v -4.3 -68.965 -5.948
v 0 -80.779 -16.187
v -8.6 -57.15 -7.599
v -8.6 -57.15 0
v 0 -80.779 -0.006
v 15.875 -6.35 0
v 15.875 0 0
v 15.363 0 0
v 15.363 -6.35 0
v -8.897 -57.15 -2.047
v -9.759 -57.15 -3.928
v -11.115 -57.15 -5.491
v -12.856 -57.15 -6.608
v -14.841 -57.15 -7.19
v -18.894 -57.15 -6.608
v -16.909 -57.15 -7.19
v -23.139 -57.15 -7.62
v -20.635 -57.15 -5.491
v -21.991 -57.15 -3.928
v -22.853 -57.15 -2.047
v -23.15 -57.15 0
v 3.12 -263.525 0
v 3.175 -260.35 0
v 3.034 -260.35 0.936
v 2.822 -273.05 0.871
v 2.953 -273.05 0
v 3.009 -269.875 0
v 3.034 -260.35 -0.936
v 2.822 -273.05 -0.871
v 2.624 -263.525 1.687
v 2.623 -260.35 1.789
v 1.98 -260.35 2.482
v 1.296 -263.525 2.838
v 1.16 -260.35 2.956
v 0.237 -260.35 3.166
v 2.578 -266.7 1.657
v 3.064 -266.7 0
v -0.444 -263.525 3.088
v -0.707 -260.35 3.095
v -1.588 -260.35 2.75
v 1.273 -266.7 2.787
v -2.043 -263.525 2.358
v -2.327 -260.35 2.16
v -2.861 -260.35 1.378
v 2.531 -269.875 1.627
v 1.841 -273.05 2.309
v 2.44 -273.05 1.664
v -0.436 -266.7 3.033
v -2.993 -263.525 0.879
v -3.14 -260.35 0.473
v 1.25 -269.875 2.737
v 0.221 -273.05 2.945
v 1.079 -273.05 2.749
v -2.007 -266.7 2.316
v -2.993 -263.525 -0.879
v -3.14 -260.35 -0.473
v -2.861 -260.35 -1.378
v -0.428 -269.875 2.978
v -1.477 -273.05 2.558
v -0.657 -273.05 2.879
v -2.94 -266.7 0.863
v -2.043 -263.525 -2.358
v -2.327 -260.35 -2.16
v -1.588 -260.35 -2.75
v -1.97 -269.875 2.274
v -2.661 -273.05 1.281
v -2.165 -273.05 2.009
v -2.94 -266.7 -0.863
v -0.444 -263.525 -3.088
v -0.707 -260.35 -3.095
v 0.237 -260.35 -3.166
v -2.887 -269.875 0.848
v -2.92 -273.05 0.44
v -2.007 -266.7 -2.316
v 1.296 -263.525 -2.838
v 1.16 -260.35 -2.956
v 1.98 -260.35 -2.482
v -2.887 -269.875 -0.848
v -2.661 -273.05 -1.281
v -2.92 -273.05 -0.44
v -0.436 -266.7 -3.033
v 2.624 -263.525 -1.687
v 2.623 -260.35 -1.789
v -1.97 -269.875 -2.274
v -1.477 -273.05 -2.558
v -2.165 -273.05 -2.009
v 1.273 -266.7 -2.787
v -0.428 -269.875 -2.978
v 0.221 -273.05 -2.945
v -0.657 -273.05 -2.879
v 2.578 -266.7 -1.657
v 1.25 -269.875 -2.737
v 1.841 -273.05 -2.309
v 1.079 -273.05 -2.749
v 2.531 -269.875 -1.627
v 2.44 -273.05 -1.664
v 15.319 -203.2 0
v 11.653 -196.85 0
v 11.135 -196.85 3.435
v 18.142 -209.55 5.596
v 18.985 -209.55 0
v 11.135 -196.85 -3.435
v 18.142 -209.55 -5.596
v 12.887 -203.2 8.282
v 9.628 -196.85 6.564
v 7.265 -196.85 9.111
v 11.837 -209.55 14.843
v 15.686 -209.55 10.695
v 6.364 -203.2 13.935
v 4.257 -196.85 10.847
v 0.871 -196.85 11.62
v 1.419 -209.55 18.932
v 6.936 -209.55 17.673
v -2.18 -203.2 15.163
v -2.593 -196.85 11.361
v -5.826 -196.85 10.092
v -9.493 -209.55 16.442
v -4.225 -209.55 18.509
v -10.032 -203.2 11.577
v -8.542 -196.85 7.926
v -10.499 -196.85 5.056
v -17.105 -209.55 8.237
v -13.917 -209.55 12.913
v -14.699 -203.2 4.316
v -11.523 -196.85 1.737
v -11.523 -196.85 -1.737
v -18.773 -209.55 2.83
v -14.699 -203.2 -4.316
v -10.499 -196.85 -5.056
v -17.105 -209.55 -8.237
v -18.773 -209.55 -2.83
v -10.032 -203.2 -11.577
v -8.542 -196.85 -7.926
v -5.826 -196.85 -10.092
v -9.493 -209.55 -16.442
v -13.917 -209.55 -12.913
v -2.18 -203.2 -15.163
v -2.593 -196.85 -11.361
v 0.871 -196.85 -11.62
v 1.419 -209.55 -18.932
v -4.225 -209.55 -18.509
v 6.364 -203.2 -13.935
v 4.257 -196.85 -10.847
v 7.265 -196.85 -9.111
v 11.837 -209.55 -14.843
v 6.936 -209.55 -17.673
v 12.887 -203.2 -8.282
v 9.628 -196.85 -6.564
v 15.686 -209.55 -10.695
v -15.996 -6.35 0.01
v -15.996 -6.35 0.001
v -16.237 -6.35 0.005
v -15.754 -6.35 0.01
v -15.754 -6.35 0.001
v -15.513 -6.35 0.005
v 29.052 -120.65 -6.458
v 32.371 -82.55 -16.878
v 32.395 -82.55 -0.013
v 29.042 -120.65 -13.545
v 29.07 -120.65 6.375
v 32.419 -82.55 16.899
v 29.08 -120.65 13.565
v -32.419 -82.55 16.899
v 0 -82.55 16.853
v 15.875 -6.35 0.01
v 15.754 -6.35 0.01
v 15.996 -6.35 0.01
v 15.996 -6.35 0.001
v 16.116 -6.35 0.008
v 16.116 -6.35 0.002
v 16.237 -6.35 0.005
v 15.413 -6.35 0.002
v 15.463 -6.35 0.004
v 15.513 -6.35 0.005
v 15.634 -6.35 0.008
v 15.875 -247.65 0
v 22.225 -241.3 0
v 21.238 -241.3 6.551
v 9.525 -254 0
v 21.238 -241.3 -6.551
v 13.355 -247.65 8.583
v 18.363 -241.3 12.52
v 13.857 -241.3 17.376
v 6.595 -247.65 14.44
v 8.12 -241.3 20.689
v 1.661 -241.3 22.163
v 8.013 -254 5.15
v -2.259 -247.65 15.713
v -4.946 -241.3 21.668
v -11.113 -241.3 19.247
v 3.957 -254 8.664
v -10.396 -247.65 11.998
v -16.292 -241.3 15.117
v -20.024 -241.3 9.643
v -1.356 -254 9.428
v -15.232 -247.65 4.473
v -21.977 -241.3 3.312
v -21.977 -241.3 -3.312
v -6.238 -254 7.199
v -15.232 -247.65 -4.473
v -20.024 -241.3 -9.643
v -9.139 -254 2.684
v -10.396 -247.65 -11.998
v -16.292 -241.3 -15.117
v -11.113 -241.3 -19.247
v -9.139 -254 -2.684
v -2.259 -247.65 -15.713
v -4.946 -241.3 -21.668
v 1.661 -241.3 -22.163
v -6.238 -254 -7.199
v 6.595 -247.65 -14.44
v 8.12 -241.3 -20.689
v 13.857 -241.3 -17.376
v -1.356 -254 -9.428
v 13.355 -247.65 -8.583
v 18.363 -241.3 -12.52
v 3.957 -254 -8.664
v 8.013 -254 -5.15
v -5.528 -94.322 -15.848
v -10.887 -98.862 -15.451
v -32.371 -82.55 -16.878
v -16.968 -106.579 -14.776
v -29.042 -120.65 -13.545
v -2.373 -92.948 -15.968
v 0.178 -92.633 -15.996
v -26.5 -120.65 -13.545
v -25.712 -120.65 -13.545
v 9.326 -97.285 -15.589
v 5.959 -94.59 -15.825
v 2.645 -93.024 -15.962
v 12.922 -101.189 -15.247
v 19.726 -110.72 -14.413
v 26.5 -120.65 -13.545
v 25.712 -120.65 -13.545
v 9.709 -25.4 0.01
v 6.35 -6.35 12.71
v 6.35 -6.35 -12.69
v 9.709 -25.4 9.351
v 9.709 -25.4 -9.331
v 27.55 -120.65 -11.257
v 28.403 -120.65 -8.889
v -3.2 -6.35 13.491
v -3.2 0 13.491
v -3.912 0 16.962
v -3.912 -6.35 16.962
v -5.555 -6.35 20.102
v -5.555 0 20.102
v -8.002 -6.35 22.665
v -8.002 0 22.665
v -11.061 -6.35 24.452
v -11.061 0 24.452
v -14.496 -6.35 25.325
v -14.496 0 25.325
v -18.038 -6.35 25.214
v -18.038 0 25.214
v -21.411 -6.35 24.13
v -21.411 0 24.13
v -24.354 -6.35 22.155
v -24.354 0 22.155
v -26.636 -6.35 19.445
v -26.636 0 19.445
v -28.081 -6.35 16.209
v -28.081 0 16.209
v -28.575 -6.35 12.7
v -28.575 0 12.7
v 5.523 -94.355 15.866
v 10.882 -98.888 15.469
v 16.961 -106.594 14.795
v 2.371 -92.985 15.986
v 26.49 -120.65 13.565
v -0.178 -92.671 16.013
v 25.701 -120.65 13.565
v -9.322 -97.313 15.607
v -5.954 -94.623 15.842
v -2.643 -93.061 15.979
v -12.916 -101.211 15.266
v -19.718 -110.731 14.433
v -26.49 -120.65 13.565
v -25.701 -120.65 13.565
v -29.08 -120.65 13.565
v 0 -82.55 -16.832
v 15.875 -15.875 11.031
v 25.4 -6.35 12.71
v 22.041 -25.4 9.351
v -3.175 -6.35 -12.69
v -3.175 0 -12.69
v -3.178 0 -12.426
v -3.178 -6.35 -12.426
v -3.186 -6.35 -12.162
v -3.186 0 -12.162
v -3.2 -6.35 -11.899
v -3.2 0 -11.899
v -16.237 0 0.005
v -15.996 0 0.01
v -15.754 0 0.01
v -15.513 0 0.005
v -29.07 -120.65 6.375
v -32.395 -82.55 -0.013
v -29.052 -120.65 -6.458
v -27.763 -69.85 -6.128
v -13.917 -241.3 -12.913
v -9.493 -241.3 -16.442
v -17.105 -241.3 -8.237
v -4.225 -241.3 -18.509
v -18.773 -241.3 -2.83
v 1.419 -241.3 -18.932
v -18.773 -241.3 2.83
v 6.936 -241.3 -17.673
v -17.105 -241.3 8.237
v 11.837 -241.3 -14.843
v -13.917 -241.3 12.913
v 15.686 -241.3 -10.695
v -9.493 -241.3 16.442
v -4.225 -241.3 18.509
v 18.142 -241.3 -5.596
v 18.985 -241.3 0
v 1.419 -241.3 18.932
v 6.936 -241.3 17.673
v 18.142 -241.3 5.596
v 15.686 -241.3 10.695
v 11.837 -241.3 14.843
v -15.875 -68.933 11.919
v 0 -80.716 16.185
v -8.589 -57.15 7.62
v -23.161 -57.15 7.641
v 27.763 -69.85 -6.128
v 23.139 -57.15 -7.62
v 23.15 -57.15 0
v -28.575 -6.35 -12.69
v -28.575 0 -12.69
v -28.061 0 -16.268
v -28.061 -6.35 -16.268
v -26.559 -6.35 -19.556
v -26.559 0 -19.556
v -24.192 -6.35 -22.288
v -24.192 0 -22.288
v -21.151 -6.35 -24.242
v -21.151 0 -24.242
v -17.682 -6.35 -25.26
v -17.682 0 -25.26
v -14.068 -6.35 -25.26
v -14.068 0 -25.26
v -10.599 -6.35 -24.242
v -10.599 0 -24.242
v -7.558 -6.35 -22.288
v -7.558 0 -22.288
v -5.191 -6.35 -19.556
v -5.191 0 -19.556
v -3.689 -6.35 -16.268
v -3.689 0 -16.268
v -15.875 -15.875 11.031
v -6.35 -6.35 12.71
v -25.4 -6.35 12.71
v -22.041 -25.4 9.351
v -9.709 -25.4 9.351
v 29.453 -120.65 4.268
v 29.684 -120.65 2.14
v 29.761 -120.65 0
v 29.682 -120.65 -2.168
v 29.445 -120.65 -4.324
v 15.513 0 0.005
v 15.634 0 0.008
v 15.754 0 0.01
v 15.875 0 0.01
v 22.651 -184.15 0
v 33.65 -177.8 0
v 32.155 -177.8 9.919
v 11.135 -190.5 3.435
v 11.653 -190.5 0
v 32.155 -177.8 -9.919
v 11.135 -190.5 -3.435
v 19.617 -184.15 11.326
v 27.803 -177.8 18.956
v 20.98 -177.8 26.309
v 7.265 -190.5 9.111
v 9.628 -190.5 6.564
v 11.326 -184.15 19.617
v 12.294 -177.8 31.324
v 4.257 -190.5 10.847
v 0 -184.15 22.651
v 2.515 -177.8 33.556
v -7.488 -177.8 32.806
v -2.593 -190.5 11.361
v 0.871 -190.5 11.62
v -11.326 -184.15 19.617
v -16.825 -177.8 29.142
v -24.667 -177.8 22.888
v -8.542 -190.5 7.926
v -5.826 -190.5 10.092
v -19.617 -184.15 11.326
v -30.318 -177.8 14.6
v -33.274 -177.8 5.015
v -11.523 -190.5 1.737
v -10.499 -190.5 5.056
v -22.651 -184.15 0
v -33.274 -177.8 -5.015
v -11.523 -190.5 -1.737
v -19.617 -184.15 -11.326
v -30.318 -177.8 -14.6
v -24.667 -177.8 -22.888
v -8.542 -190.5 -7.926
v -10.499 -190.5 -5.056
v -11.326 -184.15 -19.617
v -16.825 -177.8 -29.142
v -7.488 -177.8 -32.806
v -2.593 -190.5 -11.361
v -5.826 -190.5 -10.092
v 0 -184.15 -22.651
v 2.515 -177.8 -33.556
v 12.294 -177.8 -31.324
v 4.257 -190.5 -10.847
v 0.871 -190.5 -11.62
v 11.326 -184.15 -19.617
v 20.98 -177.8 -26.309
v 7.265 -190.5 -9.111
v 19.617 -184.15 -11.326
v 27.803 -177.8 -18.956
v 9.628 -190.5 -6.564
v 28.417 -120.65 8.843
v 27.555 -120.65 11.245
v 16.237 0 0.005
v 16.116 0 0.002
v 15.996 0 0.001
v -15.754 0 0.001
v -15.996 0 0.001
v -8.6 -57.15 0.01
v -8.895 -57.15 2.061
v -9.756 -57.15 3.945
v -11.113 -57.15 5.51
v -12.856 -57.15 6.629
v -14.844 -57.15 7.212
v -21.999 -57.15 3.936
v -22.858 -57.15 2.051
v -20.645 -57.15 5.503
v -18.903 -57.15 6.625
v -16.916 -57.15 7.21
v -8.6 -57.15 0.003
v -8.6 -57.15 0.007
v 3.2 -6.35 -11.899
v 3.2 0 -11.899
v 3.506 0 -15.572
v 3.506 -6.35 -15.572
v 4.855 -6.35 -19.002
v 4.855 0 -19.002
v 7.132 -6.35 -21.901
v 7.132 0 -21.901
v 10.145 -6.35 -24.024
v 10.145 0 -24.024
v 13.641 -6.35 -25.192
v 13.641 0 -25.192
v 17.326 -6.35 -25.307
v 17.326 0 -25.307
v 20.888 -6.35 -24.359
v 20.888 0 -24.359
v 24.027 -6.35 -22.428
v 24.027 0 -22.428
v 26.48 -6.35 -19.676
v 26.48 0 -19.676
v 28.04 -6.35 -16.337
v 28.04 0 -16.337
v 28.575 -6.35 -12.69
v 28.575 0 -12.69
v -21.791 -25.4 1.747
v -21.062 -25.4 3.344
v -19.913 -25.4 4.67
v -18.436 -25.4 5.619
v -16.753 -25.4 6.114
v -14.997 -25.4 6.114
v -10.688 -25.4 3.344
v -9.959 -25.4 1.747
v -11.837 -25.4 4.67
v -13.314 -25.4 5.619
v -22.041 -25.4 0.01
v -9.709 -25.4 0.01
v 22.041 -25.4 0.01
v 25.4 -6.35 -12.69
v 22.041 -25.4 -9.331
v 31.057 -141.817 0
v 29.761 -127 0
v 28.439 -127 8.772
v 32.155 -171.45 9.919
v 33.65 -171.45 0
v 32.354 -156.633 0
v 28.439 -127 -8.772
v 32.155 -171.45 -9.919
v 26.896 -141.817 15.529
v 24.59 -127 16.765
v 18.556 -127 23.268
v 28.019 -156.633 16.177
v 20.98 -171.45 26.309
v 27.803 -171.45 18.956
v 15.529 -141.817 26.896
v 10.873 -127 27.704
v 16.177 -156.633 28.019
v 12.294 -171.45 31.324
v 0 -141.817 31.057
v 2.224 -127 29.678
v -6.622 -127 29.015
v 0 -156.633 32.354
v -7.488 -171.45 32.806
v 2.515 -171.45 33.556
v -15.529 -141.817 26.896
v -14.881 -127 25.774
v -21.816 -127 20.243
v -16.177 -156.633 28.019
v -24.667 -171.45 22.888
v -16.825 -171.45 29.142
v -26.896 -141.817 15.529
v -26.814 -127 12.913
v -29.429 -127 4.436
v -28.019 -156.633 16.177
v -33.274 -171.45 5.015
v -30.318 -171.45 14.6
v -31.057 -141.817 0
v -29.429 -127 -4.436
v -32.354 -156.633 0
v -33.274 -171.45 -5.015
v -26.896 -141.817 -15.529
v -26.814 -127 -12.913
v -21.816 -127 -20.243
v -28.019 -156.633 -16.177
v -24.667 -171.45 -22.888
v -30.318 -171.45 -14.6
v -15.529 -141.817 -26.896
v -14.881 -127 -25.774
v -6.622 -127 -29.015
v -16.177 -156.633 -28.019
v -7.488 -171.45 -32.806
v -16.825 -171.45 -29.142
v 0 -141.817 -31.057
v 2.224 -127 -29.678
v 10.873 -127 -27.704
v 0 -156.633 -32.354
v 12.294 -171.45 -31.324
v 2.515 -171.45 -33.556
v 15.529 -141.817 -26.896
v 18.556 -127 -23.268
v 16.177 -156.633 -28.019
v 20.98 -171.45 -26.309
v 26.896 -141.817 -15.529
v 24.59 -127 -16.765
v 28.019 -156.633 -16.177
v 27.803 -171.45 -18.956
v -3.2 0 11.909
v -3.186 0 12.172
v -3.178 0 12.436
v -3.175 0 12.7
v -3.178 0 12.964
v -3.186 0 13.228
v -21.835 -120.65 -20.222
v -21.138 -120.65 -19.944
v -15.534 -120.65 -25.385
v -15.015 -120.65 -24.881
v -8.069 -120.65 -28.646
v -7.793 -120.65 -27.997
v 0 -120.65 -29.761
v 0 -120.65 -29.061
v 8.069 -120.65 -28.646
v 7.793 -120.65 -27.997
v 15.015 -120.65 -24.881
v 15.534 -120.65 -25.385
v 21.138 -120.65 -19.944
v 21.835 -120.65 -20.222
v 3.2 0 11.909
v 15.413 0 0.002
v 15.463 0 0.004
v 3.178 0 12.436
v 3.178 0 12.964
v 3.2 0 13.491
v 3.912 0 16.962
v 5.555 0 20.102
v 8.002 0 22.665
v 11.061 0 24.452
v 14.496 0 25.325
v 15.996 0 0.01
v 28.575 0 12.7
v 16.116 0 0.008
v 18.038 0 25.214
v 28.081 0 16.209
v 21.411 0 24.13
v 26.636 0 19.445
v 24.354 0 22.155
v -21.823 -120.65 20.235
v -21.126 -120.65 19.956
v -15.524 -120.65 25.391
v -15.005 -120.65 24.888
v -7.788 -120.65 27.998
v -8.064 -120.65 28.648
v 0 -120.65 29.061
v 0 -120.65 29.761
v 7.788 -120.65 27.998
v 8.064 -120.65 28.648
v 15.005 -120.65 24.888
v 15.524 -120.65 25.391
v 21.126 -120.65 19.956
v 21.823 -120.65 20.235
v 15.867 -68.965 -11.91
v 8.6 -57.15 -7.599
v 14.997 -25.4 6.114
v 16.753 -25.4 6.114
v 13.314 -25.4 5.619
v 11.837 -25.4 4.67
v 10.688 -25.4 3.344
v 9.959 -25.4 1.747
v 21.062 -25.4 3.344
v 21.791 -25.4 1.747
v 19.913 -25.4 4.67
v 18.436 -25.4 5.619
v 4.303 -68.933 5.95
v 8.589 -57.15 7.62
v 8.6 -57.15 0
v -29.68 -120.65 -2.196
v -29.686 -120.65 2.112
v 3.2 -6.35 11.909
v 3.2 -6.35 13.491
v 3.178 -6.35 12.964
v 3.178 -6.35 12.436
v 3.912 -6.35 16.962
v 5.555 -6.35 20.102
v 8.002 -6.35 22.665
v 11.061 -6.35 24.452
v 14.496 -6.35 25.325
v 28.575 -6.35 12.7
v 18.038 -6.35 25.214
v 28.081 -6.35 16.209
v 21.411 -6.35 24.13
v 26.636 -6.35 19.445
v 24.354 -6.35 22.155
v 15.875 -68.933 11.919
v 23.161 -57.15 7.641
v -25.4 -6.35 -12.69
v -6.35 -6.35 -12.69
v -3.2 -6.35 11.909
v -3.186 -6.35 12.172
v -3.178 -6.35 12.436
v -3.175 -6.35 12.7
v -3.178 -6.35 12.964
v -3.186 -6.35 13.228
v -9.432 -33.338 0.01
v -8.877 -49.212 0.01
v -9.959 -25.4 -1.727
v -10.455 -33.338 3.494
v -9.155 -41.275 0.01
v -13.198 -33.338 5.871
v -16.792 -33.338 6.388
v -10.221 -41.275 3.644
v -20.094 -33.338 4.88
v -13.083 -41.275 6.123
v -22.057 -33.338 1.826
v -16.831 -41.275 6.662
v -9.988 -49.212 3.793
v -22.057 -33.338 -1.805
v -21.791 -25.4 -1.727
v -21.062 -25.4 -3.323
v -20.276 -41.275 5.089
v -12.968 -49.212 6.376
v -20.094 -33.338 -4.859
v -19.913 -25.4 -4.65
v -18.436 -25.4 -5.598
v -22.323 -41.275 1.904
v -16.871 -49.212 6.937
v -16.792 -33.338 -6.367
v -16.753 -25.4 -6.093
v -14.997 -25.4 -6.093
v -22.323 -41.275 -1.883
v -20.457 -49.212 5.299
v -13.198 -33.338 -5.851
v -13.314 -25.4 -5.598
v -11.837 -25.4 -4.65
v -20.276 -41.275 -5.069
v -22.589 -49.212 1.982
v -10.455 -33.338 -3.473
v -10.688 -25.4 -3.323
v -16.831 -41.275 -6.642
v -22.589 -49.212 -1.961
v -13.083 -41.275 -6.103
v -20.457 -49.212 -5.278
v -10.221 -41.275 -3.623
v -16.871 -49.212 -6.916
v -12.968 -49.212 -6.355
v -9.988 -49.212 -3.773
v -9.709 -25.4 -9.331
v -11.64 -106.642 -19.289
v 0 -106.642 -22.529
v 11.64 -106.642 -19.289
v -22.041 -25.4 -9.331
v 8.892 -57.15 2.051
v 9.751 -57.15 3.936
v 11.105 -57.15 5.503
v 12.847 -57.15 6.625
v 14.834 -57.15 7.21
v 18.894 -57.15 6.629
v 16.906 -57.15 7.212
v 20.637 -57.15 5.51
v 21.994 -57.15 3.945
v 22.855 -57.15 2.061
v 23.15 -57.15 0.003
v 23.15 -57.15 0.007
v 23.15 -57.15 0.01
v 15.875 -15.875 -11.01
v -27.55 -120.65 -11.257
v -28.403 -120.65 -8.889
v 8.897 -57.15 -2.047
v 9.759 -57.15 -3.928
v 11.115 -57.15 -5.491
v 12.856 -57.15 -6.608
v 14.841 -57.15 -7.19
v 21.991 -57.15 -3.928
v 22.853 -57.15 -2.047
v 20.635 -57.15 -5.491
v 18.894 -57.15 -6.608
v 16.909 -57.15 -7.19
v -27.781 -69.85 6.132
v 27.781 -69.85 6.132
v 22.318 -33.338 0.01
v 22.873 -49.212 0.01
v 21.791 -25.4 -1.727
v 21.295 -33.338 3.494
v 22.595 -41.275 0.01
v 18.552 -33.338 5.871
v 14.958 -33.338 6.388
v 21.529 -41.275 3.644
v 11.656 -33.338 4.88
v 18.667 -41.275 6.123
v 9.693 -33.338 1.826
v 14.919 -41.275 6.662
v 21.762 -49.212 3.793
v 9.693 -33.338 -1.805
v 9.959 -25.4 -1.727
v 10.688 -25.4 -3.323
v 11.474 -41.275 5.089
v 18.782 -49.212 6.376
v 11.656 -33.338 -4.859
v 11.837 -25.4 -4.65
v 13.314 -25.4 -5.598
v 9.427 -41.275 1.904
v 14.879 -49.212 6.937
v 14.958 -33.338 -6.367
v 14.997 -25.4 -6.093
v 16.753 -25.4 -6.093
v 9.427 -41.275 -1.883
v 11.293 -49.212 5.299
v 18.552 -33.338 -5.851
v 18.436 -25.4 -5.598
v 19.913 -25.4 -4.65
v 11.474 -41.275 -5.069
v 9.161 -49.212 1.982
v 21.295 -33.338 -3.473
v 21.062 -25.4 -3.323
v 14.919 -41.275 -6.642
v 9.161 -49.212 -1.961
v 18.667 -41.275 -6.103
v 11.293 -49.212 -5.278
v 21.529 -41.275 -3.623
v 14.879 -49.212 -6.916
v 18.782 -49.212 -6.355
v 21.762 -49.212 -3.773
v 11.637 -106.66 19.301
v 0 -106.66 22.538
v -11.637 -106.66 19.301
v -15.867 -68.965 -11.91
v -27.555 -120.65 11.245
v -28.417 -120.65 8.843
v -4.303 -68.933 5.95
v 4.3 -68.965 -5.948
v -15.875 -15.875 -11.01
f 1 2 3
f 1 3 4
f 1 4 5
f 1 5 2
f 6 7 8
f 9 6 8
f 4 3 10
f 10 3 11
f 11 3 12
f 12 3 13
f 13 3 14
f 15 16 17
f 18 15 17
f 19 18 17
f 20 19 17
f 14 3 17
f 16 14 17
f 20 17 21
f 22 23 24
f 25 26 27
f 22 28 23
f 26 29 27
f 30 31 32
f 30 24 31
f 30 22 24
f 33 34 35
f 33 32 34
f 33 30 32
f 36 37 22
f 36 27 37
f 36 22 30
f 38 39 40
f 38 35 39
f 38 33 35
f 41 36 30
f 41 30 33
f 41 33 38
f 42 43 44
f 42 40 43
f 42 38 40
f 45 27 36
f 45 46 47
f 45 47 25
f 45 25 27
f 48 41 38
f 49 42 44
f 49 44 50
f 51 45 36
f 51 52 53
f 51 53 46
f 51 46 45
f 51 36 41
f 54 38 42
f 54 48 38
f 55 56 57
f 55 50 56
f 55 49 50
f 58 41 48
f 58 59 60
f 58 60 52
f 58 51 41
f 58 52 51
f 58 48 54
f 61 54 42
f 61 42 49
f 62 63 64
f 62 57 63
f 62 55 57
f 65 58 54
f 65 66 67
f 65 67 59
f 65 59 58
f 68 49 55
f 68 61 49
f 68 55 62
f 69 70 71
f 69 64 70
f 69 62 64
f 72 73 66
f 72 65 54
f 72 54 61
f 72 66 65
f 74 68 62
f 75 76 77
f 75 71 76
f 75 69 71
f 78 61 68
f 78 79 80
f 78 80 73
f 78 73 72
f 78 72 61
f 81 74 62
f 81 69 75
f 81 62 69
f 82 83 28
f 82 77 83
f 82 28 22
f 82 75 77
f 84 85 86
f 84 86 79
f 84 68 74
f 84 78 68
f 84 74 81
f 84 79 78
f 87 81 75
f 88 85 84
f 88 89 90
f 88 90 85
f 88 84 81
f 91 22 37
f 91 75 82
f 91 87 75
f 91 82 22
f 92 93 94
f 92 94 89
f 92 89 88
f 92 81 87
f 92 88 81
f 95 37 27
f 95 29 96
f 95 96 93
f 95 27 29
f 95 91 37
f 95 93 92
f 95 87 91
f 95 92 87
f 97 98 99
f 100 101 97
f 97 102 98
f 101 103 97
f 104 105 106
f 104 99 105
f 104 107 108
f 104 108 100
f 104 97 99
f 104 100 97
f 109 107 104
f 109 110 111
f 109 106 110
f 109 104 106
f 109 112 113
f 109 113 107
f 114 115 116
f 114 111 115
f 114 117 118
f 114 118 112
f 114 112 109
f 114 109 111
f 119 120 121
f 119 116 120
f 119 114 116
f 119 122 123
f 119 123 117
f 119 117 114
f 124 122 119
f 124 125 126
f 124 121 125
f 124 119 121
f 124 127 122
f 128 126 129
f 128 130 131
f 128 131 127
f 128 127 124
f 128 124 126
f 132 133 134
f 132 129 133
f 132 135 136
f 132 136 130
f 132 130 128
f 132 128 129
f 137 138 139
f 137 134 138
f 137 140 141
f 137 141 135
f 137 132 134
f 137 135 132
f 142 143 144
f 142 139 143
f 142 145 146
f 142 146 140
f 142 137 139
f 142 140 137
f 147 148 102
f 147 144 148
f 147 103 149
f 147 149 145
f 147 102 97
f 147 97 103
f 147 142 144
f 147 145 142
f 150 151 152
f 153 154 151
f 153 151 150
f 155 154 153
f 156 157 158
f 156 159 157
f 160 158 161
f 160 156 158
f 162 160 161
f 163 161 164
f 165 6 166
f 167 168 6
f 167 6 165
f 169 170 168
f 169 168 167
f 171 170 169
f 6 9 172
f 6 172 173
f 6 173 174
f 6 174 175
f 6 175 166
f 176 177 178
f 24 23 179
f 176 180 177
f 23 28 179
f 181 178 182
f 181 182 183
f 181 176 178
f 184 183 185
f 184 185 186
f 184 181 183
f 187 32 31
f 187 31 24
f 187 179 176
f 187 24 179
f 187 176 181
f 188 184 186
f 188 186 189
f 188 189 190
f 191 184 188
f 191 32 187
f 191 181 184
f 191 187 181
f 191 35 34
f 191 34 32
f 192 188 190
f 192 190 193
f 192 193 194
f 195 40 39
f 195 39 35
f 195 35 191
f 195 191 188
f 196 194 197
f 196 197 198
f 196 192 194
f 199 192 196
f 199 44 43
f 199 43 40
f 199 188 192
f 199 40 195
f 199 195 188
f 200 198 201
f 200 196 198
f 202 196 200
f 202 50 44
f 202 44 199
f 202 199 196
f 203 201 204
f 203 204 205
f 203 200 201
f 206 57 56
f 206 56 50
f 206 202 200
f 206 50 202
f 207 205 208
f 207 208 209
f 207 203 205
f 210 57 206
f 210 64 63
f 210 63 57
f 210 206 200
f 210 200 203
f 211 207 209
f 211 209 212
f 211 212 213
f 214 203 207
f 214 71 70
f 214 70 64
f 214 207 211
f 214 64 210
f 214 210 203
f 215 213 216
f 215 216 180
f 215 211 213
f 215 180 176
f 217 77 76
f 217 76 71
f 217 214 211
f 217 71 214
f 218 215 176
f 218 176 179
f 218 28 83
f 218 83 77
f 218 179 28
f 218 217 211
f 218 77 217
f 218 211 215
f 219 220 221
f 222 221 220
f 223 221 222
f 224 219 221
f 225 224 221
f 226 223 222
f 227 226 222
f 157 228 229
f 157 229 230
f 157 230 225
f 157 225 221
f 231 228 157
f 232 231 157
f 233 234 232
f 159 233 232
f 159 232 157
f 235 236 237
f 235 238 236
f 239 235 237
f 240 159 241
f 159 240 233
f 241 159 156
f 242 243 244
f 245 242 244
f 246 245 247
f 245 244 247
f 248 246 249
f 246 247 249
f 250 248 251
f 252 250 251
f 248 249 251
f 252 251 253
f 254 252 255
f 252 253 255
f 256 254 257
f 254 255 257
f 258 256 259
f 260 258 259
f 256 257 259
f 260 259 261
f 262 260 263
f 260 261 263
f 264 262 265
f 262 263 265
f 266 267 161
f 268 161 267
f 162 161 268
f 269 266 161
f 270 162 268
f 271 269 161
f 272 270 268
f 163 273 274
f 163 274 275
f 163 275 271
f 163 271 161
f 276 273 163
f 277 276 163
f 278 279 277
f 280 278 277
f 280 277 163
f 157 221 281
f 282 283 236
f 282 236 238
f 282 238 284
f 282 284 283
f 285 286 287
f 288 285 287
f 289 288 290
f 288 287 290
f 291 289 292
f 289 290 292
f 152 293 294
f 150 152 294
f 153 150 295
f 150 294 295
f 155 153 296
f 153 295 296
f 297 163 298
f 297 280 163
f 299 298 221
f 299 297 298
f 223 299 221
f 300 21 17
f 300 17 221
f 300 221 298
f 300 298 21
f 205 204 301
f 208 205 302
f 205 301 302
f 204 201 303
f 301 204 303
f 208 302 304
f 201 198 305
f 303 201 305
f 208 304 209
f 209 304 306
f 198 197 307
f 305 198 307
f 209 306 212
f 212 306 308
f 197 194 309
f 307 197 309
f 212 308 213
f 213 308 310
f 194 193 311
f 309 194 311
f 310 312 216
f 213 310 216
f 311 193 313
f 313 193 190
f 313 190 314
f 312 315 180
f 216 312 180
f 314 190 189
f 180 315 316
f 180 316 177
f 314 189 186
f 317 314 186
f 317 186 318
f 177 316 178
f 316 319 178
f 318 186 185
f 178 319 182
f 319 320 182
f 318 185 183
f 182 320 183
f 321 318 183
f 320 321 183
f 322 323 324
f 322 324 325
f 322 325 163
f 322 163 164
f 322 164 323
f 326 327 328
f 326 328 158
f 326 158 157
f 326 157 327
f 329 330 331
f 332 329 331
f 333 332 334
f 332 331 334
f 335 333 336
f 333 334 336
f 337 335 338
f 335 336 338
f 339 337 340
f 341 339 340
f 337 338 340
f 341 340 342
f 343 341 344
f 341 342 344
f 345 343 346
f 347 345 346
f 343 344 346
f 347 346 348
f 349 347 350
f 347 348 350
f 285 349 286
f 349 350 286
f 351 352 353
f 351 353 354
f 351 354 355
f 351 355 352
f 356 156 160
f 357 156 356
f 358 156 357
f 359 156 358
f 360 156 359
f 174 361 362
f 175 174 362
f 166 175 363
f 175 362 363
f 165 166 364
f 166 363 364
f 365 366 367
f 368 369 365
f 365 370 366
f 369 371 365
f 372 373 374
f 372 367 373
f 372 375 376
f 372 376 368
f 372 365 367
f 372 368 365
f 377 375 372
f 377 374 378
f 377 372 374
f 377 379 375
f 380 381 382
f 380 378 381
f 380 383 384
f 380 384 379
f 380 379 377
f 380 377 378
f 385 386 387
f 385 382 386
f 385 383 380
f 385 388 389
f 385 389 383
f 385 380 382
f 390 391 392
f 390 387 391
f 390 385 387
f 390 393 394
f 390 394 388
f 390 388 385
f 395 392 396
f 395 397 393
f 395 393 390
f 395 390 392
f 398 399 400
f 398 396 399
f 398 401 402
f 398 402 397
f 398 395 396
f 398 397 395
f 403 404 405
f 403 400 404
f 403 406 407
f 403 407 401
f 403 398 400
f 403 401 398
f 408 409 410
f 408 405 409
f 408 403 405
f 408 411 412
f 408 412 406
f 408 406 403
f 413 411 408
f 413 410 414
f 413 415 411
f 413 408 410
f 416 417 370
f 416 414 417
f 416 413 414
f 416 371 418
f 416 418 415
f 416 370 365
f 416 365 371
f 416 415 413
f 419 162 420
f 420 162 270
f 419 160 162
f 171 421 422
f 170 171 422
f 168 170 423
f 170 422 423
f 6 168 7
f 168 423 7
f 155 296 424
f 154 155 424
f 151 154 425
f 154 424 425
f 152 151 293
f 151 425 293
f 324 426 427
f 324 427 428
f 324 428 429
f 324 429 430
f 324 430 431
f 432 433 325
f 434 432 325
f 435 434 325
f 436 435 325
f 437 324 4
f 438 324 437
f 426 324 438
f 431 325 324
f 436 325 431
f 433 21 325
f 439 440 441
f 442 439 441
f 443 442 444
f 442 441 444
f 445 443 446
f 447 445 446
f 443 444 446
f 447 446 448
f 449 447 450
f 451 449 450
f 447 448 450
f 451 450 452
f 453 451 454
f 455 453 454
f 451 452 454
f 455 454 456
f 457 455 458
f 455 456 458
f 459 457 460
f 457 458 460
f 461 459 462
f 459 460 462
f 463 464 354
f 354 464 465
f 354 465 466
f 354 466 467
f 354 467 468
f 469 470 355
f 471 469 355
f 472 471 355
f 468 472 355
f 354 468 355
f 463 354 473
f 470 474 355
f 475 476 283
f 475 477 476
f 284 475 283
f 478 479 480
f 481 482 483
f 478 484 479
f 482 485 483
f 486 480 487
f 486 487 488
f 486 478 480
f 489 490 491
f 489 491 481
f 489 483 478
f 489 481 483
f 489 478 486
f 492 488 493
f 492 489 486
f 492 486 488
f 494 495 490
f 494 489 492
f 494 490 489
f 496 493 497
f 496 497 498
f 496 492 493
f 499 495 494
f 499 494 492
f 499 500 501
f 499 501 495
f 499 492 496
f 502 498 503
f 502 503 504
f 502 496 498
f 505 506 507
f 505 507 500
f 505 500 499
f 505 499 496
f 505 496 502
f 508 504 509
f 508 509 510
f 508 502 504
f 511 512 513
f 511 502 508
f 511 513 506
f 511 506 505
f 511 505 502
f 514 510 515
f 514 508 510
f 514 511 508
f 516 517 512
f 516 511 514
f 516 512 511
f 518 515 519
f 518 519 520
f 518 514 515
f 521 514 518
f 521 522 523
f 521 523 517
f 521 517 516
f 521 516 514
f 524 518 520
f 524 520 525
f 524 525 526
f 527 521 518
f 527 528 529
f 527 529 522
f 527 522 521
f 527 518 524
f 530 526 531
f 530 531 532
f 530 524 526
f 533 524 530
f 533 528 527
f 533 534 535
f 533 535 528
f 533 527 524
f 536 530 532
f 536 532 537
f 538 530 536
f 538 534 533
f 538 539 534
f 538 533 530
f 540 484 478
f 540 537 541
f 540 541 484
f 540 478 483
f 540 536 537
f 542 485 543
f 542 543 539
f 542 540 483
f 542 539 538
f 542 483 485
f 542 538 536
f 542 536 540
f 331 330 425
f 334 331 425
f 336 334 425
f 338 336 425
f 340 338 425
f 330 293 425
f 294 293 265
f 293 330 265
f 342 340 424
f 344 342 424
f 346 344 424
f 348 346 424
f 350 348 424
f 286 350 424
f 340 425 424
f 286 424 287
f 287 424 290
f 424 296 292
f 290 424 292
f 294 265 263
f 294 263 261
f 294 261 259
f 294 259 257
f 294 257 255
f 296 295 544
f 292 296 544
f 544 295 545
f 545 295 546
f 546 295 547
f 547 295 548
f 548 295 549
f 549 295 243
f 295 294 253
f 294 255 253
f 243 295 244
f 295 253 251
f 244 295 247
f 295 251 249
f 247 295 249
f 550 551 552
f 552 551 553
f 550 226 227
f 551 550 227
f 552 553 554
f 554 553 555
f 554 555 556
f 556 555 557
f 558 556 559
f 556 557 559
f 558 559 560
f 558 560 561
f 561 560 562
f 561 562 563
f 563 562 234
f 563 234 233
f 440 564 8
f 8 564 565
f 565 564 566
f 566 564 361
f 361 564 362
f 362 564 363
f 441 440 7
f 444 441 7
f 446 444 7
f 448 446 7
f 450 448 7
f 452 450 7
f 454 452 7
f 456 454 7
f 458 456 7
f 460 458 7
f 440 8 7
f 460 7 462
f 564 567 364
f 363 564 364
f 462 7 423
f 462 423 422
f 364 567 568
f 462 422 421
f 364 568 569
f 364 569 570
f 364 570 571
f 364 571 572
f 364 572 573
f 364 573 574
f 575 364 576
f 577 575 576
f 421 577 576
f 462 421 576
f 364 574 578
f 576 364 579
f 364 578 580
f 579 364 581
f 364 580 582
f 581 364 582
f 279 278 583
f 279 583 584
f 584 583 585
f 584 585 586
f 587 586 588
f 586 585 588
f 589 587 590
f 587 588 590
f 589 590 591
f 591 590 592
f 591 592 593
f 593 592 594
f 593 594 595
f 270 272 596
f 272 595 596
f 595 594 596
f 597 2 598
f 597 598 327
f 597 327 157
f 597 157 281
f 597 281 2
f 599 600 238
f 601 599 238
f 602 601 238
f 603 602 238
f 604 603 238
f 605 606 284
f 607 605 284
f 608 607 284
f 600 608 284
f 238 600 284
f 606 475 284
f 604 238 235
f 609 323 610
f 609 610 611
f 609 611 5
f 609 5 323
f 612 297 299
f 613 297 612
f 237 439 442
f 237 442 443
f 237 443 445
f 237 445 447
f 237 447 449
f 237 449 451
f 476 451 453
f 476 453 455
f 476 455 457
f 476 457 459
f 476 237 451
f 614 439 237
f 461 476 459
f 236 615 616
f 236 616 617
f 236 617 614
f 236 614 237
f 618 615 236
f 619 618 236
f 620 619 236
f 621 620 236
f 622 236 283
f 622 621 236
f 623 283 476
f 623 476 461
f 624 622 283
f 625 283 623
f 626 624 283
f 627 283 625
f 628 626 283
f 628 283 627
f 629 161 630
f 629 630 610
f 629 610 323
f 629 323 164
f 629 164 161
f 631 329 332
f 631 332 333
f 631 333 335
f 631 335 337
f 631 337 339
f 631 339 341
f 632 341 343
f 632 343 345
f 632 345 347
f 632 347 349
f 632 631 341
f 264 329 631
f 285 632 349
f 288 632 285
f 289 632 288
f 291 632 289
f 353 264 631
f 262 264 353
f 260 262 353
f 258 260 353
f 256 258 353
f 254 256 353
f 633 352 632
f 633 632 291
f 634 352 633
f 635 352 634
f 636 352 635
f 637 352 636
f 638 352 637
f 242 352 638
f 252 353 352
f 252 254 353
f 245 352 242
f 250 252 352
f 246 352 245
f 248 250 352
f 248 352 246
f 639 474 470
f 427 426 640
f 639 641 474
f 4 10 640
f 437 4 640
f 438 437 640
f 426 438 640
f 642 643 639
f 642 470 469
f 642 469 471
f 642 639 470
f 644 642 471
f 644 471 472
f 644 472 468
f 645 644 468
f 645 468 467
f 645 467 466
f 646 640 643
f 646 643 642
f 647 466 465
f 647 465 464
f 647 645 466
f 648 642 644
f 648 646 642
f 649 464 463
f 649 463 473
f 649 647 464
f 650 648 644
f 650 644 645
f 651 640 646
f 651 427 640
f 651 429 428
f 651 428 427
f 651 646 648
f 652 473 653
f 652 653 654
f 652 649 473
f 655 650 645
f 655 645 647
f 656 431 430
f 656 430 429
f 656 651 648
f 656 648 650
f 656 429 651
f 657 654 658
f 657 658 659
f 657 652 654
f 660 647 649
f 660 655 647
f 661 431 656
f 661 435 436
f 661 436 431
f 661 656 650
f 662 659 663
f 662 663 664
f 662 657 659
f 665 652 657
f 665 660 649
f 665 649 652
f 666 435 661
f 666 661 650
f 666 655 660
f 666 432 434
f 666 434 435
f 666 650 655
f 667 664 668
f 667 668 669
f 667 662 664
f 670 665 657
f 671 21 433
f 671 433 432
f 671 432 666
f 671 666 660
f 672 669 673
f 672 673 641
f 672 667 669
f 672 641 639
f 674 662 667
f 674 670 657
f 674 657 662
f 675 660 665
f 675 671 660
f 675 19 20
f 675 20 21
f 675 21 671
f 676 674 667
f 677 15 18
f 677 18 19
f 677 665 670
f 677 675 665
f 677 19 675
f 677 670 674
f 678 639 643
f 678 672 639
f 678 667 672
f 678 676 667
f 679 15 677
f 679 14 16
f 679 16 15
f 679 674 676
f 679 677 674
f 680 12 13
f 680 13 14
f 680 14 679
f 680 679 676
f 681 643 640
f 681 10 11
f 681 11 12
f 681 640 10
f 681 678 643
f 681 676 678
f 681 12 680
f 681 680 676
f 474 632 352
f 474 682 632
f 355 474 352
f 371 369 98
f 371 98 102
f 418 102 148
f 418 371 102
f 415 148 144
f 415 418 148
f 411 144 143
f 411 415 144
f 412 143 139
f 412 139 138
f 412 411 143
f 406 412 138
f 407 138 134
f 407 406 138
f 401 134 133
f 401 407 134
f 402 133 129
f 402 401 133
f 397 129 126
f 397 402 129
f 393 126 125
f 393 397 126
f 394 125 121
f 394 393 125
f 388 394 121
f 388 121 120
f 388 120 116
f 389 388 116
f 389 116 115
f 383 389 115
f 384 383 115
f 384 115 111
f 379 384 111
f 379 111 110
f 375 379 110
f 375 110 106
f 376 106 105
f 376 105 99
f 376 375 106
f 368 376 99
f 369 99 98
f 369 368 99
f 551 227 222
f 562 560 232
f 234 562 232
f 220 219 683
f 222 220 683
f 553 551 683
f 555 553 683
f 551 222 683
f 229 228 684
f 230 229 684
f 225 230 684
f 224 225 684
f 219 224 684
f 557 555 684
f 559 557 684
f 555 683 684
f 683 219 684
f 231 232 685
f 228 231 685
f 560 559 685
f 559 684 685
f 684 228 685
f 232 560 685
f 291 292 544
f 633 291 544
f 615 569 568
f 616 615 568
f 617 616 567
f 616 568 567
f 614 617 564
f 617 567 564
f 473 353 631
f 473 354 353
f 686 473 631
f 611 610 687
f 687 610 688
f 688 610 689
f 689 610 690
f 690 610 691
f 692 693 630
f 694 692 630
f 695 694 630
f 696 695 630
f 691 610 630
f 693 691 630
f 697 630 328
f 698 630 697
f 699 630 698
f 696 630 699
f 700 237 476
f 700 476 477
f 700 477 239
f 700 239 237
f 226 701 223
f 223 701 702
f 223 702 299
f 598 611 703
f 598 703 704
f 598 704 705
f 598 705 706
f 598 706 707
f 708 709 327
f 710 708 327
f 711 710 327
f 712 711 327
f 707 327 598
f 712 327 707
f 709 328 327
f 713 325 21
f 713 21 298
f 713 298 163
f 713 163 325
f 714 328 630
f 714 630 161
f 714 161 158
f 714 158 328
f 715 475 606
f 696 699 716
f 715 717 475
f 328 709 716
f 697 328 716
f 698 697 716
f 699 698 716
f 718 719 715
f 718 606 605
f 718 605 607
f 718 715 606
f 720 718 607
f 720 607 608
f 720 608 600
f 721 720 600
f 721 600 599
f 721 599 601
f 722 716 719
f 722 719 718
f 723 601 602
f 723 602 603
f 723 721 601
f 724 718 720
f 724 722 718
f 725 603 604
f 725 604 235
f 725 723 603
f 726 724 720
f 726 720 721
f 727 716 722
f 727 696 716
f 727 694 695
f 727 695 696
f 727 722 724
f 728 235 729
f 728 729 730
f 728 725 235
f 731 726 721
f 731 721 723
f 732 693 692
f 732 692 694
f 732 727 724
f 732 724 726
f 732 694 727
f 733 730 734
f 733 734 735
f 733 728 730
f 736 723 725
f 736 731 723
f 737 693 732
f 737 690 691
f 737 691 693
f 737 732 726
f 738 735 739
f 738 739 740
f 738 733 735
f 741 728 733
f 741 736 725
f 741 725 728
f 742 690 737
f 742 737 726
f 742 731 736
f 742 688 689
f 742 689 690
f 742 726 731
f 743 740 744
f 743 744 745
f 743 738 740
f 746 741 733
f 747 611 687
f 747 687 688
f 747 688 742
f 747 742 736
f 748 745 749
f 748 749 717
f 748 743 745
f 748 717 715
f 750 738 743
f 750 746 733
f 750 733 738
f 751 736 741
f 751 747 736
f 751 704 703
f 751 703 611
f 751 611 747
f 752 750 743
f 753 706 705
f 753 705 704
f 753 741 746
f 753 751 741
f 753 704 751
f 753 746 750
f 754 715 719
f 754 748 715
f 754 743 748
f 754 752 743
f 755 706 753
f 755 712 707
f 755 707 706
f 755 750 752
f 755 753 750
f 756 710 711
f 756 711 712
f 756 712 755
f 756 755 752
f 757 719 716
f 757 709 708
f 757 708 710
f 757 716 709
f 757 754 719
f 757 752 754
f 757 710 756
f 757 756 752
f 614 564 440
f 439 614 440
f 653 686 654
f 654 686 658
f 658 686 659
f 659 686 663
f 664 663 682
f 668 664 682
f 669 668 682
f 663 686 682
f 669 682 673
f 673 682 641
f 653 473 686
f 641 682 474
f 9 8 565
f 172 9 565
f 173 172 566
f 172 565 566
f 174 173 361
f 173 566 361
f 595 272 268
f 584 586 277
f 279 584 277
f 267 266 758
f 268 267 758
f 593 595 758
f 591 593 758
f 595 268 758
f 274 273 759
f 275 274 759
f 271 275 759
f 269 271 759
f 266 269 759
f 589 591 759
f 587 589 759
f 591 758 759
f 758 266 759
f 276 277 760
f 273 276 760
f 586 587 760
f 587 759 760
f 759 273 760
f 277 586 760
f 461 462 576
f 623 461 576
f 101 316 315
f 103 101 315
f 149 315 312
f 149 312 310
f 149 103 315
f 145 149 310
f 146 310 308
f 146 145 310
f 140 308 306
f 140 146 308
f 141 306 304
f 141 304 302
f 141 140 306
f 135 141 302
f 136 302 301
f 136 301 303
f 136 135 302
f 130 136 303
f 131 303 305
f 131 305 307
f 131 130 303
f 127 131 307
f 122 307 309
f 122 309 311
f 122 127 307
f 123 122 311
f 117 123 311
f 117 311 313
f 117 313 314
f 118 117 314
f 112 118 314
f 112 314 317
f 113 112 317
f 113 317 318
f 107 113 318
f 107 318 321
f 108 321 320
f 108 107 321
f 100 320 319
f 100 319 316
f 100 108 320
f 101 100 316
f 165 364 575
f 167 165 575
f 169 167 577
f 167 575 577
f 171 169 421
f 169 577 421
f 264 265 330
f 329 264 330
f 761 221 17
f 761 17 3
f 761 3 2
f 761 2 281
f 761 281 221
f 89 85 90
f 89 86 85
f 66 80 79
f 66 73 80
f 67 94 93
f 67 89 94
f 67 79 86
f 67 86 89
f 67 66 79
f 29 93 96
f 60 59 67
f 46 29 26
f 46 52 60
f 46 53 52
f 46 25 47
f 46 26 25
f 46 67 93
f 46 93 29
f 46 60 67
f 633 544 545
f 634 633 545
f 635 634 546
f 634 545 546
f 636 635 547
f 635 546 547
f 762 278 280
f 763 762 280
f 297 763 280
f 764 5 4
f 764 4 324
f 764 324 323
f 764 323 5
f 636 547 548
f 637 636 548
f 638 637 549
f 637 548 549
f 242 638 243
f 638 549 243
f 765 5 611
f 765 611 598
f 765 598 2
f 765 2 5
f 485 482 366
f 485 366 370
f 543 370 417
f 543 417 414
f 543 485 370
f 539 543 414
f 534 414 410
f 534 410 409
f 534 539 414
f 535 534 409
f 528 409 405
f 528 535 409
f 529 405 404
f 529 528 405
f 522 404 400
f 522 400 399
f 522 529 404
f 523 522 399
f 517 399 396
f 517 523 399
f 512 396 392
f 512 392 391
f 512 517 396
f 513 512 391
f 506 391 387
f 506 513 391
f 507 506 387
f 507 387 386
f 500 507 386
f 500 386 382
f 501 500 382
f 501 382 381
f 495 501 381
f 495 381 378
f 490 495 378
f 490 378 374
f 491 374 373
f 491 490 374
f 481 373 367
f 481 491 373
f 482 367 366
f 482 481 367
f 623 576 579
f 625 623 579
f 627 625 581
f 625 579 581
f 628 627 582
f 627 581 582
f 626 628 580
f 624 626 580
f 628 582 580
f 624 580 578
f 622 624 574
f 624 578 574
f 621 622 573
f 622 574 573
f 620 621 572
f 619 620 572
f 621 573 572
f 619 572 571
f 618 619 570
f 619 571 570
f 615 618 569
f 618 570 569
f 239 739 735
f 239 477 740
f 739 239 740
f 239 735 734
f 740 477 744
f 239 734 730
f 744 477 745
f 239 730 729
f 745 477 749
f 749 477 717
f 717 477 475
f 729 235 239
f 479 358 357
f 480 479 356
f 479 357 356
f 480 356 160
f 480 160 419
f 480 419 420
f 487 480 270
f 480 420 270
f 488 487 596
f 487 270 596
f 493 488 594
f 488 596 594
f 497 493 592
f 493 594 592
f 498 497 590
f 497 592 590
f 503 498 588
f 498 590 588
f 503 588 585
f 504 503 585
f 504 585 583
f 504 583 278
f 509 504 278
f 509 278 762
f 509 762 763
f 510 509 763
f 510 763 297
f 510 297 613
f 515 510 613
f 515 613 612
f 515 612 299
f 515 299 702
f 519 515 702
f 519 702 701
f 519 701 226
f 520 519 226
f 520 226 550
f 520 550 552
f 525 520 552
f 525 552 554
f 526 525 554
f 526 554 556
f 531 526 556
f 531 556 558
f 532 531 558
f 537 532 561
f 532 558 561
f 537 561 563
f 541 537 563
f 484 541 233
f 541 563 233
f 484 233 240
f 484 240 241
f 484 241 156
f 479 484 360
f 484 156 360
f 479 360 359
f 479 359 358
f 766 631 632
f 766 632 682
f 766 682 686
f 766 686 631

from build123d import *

# Parameters (mm, degrees)
F1_DEPTH   = 6.35
F3_DEPTH   = 19.05
F3_TAPER   = 10
F4_R       = 6.1659710175
F5_DEPTH   = 31.75
F5_TAPER   = -2
F7_DEPTH   = 25.4
F7_TAPER   = -20
F9_DEPTH   = 38.1
F9_TAPER   = 5
F11_DEPTH  = 38.1
F11_TAPER  = 25
F12_R      = 29.7610911
F13_DEPTH  = 6.35
F13_FACE_R = 29.7610911
F14_DEPTH  = 44.45
F14_TAPER  = -5
F15_DEPTH  = 6.35
F15_FACE_R = 33.6499621937
F16_DEPTH  = 12.7
F16_TAPER  = 60
F17_DEPTH  = 6.35
F17_FACE_R = 11.6529169376
F18_DEPTH  = 12.7
F18_TAPER  = -30
F19_DEPTH  = 31.75
F20_R      = 22.225
F21_DEPTH  = 19.05
F21_TAPER  = 45
F21_FACE_R = 3.175
F22_DEPTH  = 12.7
F22_TAPER  = 1


with BuildPart() as f1:
    # F0 (on Front) → F1 (new body)
    with BuildSketch(Plane.XZ):
        with BuildLine():
            ThreePointArc((3.199654923, 13.4909659788), (3.175, 12.7), (3.199654923, 11.9090340212))
            Line((3.199654923, 11.9090340212), (3.199654923, 13.4909659788))
        make_face()
        with BuildLine():
            Line((15.362857355, 0), (3.199654923, 0))
            Line((3.199654923, 0), (3.199654923, -11.8987034381))
            ThreePointArc((3.199654923, -11.8987034381), (6.9939953282, -3.6112468657), (15.362857355, 0))
        make_face()
        with BuildLine():
            ThreePointArc((16.2371763723, 0.0051652915), (24.9824046777, -3.8383881517), (28.575, -12.6896694169))
            Line((28.575, -12.6896694169), (28.575, 12.7))
            ThreePointArc((28.575, 12.7), (24.9824046777, 3.8487187348), (16.2371763723, 0.0051652915))
        make_face()
        with BuildLine():
            Line((3.199654923, 11.9090340212), (3.199654923, 0))
            Line((3.199654923, 0), (15.362857355, 0))
            ThreePointArc((15.362857355, 0), (15.4378328626, 0.0028041361), (15.5128236277, 0.0051652915))
            ThreePointArc((15.5128236277, 0.0051652915), (7.0477827676, 3.5692696934), (3.199654923, 11.9090340212))
        make_face()
        with BuildLine():
            Line((15.875, 0), (15.362857355, 0))
            ThreePointArc((15.362857355, 0), (6.9939953282, -3.6112468657), (3.199654923, -11.8987034381))
            ThreePointArc((3.199654923, -11.8987034381), (15.4793249297, -25.3835041897), (28.575, -12.6896694169))
            ThreePointArc((28.575, -12.6896694169), (24.9824046777, -3.8383881517), (16.2371763723, 0.0051652915))
            ThreePointArc((16.2371763723, 0.0051652915), (16.0561066018, 0.0012913885), (15.875, 0))
        make_face()
        with BuildLine():
            Line((3.199654923, 13.4909659788), (3.199654923, 11.9090340212))
            ThreePointArc((3.199654923, 11.9090340212), (7.0477827676, 3.5692696934), (15.5128236277, 0.0051652915))
            ThreePointArc((15.5128236277, 0.0051652915), (15.6938933982, 0.0090391945), (15.875, 0.0103305831))
            ThreePointArc((15.875, 0.0103305831), (16.0561066018, 0.0090391945), (16.2371763723, 0.0051652915))
            ThreePointArc((16.2371763723, 0.0051652915), (24.9824046777, 3.8487187348), (28.575, 12.7))
            ThreePointArc((28.575, 12.7), (16.2706750703, 25.3938347728), (3.199654923, 13.4909659788))
        make_face()
    extrude(amount=F1_DEPTH)

    # F2 (on face) → F3, piece 2 (join)
    with BuildSketch(Plane.XZ.offset(6.35)):
        Polygon((15.875, -12.6896694169), (25.4, -12.6896694169), (25.4, 12.7103305831), (6.35, 12.7103305831), (6.35, -12.6896694169), align=None)
    extrude(amount=F3_DEPTH, taper=F3_TAPER)

    # F4 (on face) → F5, piece 2 (join)
    with BuildSketch(Plane.XZ.offset(25.4)):
        with Locations((15.875, 0.0103305831)):
            Circle(F4_R)
    extrude(amount=F5_DEPTH, taper=F5_TAPER)



with BuildPart() as f1b:
    # F0 (on Front) → F1, piece 2 (new body)
    with BuildSketch(Plane.XZ):
        with BuildLine():
            Line((-3.199654923, 13.4909659788), (-3.199654923, 11.9090340212))
            ThreePointArc((-3.199654923, 11.9090340212), (-3.1811652272, 12.3043249297), (-3.175, 12.7))
            ThreePointArc((-3.175, 12.7), (-3.1811652272, 13.0956750703), (-3.199654923, 13.4909659788))
        make_face()
        with BuildLine():
            ThreePointArc((-15.5128236277, 0.0051652915), (-7.0477827676, -3.5589391103), (-3.199654923, -11.8987034381))
            Line((-3.199654923, -11.8987034381), (-3.199654923, 11.9090340212))
            ThreePointArc((-3.199654923, 11.9090340212), (-7.0477827676, 3.5692696934), (-15.5128236277, 0.0051652915))
        make_face()
        with BuildLine():
            ThreePointArc((-16.2371763723, 0.0051652915), (-15.875, 0.0103305831), (-15.5128236277, 0.0051652915))
            ThreePointArc((-15.5128236277, 0.0051652915), (-7.0477827676, 3.5692696934), (-3.199654923, 11.9090340212))
            Line((-3.199654923, 11.9090340212), (-3.199654923, 13.4909659788))
            ThreePointArc((-3.199654923, 13.4909659788), (-16.2706750703, 25.3938347728), (-28.575, 12.7))
            ThreePointArc((-28.575, 12.7), (-24.9824046777, 3.8487187348), (-16.2371763723, 0.0051652915))
        make_face()
        with BuildLine():
            ThreePointArc((-28.575, -12.6896694169), (-15.875, -25.3896694169), (-3.175, -12.6896694169))
            ThreePointArc((-3.175, -12.6896694169), (-3.1811652272, -12.2939943467), (-3.199654923, -11.8987034381))
            ThreePointArc((-3.199654923, -11.8987034381), (-7.0477827676, -3.5589391103), (-15.5128236277, 0.0051652915))
            ThreePointArc((-15.5128236277, 0.0051652915), (-15.875, 0), (-16.2371763723, 0.0051652915))
            ThreePointArc((-16.2371763723, 0.0051652915), (-24.9824046777, -3.8383881517), (-28.575, -12.6896694169))
        make_face()
        with BuildLine():
            Line((-28.575, 12.7), (-28.575, -12.6896694169))
            ThreePointArc((-28.575, -12.6896694169), (-24.9824046777, -3.8383881517), (-16.2371763723, 0.0051652915))
            ThreePointArc((-16.2371763723, 0.0051652915), (-24.9824046777, 3.8487187348), (-28.575, 12.7))
        make_face()
    extrude(amount=F1_DEPTH)

    # F2 (on face) → F3 (join)
    with BuildSketch(Plane.XZ.offset(6.35)):
        Polygon((-25.4, -12.6896694169), (-15.875, -12.6896694169), (-6.35, -12.6896694169), (-6.35, 12.7103305831), (-25.4, 12.7103305831), align=None)
    extrude(amount=F3_DEPTH, taper=F3_TAPER)

    # F4 (on face) → F5 (join)
    with BuildSketch(Plane.XZ.offset(25.4)):
        with Locations((-15.875, 0.0103305831)):
            Circle(F4_R)
    extrude(amount=F5_DEPTH, taper=F5_TAPER)


with BuildPart() as f1_1:
    add(f1.part)

    add(f1b.part)  # F7 merges F1b
    # F6 (on face) → F7 (join)
    with BuildSketch(Plane.XZ.offset(57.15)):
        Polygon((-8.6003018862, -7.5993465171), (-8.6003018862, 0), (-8.5894809611, 7.6199923168), (-23.1605484229, 7.6406842576), (-23.1496981138, 0), (-23.1388771887, -7.6199923168), align=None)
        Polygon((8.5894809611, 7.6199923168), (8.6003018862, 0), (8.6003018862, -7.5993465171), (23.1388771887, -7.6199923168), (23.1496981138, 0), (23.1605484229, 7.6406842576), align=None)
    extrude(amount=F7_DEPTH, taper=F7_TAPER)

    # F8 (on face) → F9 (join)
    with BuildSketch(Plane.XZ.offset(82.55)):
        Polygon((32.4185487065, 16.8986845412), (-32.4185487065, 16.8986845412), (-32.370583502, -16.8779552611), (32.370583502, -16.8779552611), align=None)
    extrude(amount=F9_DEPTH, taper=F9_TAPER)

    # F10 (on face) → F11 (join)
    with BuildSketch(Plane.XZ.offset(120.65)):
        with BuildLine():
            ThreePointArc((25.711790805, -13.5446371807), (28.2114240531, -6.9763124682), (29.061200642, 0))
            ThreePointArc((29.061200642, 0), (28.2086089518, 6.9876865813), (25.7008602101, 13.5653664608))
            Line((25.7008602101, 13.5653664608), (-25.7008602101, 13.5653664608))
            ThreePointArc((-25.7008602101, 13.5653664608), (-28.2135633586, 6.9676556579), (-29.0611713394, -0.0412690571))
            ThreePointArc((-29.0611713394, -0.0412690571), (-28.2064635002, -6.9963418704), (-25.711790805, -13.5446371807))
            Line((-25.711790805, -13.5446371807), (25.711790805, -13.5446371807))
        make_face()
        with BuildLine():
            ThreePointArc((-25.711790805, -13.5446371807), (0, -29.061200642), (25.711790805, -13.5446371807))
            Line((25.711790805, -13.5446371807), (-25.711790805, -13.5446371807))
        make_face()
        with BuildLine():
            Line((-25.7008602101, 13.5653664608), (25.7008602101, 13.5653664608))
            ThreePointArc((25.7008602101, 13.5653664608), (0, 29.061200642), (-25.7008602101, 13.5653664608))
        make_face()
    extrude(amount=-F11_DEPTH, taper=F11_TAPER)

    # F12 (on face) → F13 (join)
    with BuildSketch(Plane.XZ.offset(120.65)):
        Circle(F12_R)
    extrude(amount=F13_DEPTH)

    # F13_face (on face) → F14 (join)
    with BuildSketch(Plane.XZ.offset(127)):
        Circle(F13_FACE_R)
    extrude(amount=F14_DEPTH, taper=F14_TAPER)

    # F15 (add): a face of the model
    f15_faces = [f1_1.faces().sort_by_distance(p)[0] for p in [
        (0, -171.45, 0),
    ]]
    extrude(f15_faces, amount=F15_DEPTH)

    # F15_face (on face) → F16 (join)
    with BuildSketch(Plane.XZ.offset(177.8)):
        Circle(F15_FACE_R)
    extrude(amount=F16_DEPTH, taper=F16_TAPER)

    # F17 (add): a face of the model
    f17_faces = [f1_1.faces().sort_by_distance(p)[0] for p in [
        (0, -190.5, 0),
    ]]
    extrude(f17_faces, amount=F17_DEPTH)

    # F17_face (on face) → F18 (join)
    with BuildSketch(Plane.XZ.offset(196.85)):
        Circle(F17_FACE_R)
    extrude(amount=F18_DEPTH, taper=F18_TAPER)

    # F19 (add): a face of the model
    f19_faces = [f1_1.faces().sort_by_distance(p)[0] for p in [
        (0, -209.55, 0),
    ]]
    extrude(f19_faces, amount=F19_DEPTH)

    # F20 (on face) → F21 (join)
    with BuildSketch(Plane.XZ.offset(241.3)):
        Circle(F20_R)
    extrude(amount=F21_DEPTH, taper=F21_TAPER)

    # F21_face (on face) → F22 (join)
    with BuildSketch(Plane.XZ.offset(260.35)):
        Circle(F21_FACE_R)
    extrude(amount=F22_DEPTH, taper=F22_TAPER)


solid = f1_1.part
